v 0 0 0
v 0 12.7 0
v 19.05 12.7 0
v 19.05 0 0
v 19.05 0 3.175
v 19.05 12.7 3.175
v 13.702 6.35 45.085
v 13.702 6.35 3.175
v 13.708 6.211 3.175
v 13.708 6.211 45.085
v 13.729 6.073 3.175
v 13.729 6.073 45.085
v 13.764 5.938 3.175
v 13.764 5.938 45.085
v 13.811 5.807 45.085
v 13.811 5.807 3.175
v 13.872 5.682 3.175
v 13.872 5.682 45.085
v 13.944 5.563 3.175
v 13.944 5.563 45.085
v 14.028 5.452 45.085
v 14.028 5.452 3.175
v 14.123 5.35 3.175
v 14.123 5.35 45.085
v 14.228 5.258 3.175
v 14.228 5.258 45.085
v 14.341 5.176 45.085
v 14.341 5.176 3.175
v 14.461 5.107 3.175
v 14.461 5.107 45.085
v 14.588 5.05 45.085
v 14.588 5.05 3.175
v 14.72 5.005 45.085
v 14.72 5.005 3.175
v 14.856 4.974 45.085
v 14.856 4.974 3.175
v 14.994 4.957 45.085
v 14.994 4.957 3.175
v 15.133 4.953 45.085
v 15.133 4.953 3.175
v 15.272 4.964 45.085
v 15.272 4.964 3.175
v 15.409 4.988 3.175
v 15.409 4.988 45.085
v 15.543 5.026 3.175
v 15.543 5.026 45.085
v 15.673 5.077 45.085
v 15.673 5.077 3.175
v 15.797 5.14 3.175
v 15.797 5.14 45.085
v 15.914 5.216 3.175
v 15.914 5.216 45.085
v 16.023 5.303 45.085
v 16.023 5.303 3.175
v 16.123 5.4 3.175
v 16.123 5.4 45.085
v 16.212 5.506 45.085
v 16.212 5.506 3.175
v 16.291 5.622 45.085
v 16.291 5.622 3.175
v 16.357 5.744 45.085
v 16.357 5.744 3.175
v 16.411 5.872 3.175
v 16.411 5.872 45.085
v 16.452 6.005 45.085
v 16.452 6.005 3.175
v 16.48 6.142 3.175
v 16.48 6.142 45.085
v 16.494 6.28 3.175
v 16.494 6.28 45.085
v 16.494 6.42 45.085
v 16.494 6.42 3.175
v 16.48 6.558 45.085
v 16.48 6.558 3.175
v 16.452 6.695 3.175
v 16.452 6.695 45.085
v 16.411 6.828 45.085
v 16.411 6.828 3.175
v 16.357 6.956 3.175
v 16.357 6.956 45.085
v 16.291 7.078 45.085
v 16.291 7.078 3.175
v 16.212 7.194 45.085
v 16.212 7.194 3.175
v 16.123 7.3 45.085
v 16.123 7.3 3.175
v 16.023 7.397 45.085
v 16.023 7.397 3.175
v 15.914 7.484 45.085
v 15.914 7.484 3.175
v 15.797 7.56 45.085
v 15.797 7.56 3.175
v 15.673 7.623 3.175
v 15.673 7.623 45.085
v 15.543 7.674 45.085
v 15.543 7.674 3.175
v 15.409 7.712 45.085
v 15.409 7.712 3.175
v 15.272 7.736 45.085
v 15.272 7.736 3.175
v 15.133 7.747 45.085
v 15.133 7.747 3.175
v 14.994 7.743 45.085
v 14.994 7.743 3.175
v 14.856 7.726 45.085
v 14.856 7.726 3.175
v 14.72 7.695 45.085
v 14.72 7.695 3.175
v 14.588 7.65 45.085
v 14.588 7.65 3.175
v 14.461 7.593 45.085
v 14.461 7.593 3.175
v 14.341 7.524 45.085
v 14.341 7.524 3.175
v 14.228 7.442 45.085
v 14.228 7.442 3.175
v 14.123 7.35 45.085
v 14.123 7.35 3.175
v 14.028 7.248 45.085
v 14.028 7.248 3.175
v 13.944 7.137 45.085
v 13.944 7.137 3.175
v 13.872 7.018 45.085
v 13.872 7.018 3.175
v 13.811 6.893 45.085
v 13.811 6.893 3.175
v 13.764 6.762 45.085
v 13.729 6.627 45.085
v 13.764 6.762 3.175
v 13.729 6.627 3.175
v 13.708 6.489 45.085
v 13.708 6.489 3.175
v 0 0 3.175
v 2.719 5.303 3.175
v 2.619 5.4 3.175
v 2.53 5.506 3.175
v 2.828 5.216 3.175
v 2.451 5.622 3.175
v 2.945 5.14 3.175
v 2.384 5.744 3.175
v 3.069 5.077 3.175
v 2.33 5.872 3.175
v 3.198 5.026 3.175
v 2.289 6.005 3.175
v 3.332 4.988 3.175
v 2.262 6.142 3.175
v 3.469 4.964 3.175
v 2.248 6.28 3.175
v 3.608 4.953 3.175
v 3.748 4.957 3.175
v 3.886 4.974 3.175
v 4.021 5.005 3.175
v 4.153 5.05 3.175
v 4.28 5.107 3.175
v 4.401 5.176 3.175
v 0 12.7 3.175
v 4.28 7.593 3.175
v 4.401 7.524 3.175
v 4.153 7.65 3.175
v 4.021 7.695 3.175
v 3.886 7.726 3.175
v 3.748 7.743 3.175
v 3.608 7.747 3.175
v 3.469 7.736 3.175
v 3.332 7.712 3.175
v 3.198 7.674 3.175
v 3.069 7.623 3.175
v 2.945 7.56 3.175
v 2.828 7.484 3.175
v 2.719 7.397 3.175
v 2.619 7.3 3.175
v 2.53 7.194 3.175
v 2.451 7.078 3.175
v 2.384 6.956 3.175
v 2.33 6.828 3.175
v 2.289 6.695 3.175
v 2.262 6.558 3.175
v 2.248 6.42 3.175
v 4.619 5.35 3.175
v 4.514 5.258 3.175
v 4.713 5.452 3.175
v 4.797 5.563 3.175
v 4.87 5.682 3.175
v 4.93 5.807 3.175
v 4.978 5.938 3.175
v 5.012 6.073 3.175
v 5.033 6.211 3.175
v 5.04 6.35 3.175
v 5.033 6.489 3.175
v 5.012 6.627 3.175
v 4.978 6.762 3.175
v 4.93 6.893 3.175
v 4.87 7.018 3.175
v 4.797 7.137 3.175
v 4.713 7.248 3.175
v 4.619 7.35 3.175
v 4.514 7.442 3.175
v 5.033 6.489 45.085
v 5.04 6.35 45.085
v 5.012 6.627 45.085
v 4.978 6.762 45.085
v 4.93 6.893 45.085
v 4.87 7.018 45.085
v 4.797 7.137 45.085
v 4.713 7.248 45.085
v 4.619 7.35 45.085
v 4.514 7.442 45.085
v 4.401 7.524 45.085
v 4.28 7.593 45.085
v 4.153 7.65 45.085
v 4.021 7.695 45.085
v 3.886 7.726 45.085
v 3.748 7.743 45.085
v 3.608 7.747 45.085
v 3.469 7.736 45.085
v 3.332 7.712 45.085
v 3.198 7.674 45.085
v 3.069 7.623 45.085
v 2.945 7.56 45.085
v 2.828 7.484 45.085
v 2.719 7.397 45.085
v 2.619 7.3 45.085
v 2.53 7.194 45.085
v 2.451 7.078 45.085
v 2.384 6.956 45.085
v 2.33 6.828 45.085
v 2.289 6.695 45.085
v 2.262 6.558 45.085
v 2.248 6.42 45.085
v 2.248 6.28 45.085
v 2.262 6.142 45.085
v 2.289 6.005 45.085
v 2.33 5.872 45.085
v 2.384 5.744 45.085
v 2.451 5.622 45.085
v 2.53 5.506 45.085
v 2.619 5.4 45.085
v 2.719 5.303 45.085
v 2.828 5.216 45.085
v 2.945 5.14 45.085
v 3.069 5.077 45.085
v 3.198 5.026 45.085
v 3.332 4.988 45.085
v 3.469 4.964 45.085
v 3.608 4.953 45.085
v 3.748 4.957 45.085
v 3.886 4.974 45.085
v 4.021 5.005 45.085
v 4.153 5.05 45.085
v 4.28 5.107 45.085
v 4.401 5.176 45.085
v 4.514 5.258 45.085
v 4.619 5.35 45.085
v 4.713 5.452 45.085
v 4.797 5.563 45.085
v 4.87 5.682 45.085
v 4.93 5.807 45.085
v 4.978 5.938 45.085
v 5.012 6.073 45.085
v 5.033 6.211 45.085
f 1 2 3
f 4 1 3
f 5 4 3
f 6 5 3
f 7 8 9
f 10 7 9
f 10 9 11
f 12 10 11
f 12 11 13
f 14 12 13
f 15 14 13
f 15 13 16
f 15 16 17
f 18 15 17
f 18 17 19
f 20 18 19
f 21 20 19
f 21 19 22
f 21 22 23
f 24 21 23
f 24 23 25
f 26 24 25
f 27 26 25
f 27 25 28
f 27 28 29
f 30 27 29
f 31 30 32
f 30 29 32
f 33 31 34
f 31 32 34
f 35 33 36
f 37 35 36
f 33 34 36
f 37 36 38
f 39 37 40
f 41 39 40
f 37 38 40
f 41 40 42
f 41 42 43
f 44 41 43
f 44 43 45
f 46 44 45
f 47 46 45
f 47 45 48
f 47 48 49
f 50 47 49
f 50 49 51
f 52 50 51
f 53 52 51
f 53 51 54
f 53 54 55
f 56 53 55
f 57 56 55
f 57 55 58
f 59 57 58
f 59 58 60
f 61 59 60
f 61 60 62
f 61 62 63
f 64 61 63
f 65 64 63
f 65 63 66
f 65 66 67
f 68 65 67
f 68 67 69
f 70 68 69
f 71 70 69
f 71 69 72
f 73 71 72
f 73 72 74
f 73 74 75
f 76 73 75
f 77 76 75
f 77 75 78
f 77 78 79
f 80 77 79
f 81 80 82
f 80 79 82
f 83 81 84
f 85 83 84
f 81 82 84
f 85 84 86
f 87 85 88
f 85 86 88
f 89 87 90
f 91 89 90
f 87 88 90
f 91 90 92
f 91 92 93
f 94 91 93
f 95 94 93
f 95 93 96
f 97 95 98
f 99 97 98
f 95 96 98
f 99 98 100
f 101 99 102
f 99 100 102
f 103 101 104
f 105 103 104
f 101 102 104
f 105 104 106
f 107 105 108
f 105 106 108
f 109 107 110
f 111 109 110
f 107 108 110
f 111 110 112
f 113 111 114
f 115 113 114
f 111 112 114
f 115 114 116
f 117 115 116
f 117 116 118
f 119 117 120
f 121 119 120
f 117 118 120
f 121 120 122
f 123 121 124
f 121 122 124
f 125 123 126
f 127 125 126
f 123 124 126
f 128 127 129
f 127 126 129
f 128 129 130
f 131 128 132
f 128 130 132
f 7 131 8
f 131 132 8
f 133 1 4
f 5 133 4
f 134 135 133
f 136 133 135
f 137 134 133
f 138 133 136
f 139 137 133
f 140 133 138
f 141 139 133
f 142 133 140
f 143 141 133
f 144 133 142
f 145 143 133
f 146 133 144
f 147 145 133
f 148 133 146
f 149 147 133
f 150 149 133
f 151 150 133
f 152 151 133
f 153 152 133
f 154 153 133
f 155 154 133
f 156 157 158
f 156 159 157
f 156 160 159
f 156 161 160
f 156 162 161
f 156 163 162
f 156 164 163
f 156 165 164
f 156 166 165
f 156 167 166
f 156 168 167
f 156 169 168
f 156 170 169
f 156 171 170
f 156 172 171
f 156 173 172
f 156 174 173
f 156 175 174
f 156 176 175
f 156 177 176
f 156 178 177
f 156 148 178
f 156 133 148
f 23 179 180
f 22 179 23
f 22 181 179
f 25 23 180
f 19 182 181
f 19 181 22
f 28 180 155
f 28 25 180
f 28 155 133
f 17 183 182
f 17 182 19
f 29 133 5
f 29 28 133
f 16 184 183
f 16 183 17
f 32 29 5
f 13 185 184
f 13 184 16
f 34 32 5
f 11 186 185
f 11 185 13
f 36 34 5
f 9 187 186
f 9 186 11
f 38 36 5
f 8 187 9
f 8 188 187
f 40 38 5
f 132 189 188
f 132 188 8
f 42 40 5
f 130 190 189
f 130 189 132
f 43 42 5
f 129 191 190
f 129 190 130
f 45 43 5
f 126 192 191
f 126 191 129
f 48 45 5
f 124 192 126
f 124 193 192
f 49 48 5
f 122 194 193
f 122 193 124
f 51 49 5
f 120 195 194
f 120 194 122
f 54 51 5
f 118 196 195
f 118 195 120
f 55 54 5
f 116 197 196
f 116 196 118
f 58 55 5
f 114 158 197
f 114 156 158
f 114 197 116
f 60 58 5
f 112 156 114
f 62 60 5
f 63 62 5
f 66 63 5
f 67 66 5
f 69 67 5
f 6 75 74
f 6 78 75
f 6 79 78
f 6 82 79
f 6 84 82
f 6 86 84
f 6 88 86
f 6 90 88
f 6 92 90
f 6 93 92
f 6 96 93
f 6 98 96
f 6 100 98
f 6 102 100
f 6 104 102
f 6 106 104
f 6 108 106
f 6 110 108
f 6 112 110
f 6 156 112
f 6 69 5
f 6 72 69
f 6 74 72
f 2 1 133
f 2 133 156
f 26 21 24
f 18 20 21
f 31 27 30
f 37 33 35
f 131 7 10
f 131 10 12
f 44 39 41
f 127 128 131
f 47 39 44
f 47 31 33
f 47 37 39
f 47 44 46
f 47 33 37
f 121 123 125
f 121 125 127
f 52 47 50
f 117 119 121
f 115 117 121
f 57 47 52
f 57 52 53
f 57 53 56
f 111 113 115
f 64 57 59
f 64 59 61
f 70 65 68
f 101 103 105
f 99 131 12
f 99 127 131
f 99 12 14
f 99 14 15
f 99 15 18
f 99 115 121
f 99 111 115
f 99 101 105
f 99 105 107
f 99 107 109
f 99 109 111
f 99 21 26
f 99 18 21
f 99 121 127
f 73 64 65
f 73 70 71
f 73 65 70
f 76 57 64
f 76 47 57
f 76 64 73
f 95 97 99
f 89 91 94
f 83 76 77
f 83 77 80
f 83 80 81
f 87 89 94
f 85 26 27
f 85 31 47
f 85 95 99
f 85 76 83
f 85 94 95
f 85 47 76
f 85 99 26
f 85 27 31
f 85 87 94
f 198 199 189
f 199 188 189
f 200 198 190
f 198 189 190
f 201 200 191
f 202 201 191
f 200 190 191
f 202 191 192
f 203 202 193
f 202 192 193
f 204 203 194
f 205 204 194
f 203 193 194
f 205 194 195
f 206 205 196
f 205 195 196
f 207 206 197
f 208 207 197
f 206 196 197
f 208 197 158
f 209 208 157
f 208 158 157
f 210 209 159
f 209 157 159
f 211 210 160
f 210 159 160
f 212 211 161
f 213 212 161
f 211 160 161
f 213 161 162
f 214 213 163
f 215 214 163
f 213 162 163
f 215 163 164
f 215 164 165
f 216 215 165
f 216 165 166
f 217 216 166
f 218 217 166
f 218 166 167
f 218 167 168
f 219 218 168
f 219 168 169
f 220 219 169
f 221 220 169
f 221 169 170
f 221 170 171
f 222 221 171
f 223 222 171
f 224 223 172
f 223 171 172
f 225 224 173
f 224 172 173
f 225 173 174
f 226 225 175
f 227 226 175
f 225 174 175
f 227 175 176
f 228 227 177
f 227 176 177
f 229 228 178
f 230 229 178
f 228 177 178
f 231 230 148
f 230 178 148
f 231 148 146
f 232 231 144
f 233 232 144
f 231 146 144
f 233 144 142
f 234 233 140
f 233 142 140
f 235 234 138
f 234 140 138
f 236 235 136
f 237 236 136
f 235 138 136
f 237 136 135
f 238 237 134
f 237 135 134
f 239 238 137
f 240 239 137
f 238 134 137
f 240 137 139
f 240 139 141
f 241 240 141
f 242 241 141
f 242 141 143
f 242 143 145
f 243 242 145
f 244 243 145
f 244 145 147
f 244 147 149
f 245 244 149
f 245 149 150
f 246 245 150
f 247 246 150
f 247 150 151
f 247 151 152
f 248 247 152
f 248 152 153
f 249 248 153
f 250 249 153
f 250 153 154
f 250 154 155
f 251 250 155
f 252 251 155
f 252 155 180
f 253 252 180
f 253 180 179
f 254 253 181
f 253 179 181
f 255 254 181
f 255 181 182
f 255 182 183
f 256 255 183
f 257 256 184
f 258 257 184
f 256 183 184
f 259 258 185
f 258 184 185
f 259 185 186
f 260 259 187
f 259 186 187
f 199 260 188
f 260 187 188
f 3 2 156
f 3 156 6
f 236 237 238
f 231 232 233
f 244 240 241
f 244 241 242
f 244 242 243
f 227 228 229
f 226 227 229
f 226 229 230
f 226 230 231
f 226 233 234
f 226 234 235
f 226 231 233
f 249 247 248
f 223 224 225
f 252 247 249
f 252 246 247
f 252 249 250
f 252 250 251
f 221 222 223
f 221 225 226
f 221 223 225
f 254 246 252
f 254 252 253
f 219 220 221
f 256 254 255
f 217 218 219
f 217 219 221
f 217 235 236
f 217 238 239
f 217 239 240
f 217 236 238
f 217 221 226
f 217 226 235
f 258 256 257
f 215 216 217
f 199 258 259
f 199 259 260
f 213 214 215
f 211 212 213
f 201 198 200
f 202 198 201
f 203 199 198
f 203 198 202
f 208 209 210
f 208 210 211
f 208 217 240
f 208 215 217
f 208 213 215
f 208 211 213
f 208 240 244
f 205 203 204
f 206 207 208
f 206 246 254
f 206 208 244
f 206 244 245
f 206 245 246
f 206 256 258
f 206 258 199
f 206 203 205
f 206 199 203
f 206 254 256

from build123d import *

# Parameters (mm, degrees)
F0_W     = 19.05
F0_H     = 12.7
F1_DEPTH = 3.175
F2_R     = 1.397
F3_DEPTH = 6.35
F4_R     = 1.397
F5_DEPTH = 35.56


with BuildPart() as f1:
    # F0 (on Top) → F1 (new body)
    with BuildSketch(Plane.XY):
        with Locations((9.525, 6.35)):
            Rectangle(F0_W, F0_H)
    extrude(amount=F1_DEPTH)

    # F2 (on face) → F3 (join)
    with BuildSketch(Plane.XY.offset(3.175)):
        with Locations((3.643117, 6.35)):
            Circle(F2_R)
        with BuildLine():
            ThreePointArc((16.495517, 6.35), (15.098517, 7.747), (13.701517, 6.35))
            ThreePointArc((13.701517, 6.35), (15.098517, 4.953), (16.495517, 6.35))
        make_face()
    extrude(amount=F3_DEPTH)

    # F4 (on face) → F5 (join)
    with BuildSketch(Plane.XY.offset(9.525)):
        with Locations((3.643117, 6.35)):
            Circle(F4_R)
        with BuildLine():
            ThreePointArc((16.495517, 6.35), (15.098517, 7.747), (13.701517, 6.35))
            ThreePointArc((13.701517, 6.35), (15.098517, 4.953), (16.495517, 6.35))
        make_face()
    extrude(amount=F5_DEPTH)


solid = f1.part
